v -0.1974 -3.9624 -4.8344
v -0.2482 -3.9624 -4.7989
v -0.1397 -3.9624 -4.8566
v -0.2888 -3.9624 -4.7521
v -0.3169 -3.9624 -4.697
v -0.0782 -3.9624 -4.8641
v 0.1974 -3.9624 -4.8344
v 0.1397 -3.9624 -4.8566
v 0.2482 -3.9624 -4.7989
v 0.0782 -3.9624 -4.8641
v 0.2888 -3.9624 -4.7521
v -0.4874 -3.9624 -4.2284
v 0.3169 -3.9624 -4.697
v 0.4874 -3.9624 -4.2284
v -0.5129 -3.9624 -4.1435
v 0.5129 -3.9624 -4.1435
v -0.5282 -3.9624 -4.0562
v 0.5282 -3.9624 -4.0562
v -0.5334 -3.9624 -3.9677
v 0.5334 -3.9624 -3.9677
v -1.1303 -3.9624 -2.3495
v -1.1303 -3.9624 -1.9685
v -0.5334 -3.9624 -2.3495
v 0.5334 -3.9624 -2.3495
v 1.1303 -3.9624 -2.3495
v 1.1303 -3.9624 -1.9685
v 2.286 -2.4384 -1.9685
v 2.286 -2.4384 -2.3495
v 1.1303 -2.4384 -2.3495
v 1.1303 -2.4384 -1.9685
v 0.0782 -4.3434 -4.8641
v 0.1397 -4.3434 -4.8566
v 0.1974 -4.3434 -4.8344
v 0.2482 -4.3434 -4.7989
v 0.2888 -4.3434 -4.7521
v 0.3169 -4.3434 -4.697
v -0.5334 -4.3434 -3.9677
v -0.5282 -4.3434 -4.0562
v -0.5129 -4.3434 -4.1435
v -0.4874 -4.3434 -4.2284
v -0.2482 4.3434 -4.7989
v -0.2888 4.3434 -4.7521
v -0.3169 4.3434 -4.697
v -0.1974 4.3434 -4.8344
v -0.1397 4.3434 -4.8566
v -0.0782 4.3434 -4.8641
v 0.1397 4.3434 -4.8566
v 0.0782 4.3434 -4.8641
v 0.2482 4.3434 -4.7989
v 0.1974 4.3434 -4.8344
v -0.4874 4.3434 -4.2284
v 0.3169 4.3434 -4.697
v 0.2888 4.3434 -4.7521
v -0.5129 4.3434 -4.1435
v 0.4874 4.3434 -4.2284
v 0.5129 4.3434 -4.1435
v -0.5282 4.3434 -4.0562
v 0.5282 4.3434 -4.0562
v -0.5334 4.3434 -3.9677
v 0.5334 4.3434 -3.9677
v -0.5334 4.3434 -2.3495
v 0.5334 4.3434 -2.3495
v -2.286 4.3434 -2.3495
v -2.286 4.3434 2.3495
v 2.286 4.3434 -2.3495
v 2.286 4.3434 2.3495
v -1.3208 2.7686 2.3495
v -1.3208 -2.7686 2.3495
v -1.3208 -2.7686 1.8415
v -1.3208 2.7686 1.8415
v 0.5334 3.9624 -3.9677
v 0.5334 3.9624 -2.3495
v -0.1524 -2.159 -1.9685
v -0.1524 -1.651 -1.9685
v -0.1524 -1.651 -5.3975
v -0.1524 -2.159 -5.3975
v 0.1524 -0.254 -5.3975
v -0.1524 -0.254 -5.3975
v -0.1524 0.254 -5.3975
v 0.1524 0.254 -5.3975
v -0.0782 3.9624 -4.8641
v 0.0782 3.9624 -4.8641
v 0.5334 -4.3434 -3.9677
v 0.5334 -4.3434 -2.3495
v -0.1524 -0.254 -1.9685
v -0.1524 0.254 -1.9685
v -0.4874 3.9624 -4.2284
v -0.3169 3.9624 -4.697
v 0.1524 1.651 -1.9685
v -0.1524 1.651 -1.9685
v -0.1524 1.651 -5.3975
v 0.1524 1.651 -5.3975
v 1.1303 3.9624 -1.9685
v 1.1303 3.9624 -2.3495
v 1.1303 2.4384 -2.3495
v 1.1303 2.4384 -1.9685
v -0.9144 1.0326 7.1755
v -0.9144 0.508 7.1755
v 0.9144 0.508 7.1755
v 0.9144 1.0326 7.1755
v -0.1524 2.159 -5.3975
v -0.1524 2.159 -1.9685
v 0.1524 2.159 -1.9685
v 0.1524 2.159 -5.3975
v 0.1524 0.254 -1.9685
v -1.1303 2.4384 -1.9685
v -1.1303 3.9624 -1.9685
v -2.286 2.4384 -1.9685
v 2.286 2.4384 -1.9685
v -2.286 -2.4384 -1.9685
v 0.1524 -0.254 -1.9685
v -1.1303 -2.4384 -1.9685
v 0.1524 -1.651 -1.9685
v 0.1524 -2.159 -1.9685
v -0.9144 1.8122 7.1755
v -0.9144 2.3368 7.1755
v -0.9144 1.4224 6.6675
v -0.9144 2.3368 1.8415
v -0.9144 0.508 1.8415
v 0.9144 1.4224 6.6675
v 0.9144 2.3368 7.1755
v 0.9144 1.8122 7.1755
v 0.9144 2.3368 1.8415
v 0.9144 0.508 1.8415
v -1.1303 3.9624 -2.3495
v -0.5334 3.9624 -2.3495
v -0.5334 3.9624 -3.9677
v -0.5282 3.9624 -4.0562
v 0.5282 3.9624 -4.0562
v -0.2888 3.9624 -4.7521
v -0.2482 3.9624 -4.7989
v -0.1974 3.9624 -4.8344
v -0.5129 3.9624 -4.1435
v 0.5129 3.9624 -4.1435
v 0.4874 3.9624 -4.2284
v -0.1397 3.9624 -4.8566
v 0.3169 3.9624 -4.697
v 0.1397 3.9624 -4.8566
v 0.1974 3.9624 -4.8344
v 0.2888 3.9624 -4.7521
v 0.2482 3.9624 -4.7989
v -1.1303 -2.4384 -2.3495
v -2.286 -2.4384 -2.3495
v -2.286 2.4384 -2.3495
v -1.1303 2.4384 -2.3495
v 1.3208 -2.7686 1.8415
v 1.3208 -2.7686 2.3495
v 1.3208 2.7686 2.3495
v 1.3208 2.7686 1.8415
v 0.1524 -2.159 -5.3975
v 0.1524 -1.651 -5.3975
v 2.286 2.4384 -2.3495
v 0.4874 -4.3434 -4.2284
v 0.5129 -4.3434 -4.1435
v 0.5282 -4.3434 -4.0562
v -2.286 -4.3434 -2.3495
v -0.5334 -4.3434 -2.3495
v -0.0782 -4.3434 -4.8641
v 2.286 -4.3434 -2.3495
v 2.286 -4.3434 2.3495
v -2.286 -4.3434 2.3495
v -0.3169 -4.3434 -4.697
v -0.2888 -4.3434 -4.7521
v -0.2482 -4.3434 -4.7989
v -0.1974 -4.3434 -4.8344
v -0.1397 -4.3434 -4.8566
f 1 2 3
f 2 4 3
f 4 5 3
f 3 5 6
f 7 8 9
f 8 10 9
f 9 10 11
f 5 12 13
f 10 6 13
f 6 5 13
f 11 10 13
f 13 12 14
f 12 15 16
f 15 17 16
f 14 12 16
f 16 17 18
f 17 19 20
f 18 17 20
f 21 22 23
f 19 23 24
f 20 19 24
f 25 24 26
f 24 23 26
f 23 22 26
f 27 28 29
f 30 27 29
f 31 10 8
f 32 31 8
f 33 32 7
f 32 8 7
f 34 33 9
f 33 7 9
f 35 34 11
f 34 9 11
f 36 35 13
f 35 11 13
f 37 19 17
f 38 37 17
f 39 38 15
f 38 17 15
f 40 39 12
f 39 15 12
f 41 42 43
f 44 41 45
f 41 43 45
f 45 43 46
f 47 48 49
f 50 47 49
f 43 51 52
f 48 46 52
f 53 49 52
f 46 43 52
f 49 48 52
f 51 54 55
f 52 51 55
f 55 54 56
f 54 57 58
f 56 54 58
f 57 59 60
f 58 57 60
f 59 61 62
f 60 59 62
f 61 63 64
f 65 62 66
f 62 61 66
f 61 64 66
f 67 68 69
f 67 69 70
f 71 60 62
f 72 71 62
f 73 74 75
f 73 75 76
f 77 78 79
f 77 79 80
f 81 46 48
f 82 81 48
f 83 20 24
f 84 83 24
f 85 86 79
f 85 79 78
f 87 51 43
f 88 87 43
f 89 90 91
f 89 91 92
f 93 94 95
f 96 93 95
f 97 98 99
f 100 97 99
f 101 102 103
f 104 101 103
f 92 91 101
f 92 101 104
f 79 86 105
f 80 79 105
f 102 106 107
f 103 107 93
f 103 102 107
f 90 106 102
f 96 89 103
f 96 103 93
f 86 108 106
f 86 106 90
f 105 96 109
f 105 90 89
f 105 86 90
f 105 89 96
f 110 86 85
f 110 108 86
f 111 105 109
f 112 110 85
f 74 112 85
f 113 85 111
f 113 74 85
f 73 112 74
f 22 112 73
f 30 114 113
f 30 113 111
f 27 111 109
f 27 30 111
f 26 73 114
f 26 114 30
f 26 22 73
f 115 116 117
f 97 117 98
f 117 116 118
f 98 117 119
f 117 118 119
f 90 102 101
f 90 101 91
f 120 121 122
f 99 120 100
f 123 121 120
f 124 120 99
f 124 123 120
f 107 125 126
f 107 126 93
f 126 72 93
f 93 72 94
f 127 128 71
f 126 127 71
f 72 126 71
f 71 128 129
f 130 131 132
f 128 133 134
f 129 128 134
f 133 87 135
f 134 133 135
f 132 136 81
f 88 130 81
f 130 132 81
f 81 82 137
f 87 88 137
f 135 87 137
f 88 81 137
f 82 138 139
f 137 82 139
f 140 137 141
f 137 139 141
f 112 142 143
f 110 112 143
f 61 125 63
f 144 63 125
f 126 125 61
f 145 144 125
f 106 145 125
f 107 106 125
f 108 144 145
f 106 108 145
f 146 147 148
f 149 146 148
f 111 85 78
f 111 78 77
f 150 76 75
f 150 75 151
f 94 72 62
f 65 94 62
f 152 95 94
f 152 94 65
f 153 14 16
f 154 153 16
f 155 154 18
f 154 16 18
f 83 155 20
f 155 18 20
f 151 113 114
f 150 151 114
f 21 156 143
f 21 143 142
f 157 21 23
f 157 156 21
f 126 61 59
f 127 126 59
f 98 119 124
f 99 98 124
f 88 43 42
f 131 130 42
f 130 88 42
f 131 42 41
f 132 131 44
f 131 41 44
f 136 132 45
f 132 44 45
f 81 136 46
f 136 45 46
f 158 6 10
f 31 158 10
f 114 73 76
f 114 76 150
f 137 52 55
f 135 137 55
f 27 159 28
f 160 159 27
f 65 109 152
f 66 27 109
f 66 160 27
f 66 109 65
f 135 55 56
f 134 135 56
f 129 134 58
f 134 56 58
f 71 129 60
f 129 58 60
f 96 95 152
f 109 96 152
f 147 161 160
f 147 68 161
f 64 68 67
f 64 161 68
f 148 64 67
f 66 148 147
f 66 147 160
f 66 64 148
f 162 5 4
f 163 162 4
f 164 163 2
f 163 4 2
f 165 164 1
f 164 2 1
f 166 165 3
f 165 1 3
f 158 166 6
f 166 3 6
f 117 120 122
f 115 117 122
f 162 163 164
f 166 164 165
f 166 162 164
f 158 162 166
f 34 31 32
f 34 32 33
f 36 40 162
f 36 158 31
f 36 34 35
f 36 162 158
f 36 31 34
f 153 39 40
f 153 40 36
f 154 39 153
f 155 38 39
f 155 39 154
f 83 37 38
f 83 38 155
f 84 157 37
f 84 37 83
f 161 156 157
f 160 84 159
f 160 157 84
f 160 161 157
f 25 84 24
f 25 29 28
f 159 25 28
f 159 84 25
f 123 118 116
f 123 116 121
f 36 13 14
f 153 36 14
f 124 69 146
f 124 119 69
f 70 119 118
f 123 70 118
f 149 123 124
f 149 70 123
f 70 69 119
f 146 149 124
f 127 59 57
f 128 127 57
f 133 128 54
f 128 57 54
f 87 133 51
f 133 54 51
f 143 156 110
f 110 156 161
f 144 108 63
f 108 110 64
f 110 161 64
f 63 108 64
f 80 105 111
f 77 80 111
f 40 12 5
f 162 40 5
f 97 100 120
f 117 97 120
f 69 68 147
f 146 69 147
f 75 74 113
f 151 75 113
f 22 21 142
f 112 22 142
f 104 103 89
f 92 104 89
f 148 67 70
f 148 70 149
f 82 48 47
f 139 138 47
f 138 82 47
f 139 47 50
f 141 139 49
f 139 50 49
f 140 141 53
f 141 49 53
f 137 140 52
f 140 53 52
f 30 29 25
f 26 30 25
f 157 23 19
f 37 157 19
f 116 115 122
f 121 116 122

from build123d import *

# Parameters (mm, degrees)
F0_W           = 4.572
F0_H           = 8.6868
F1_DEPTH       = 2.3495
F2_W           = 2.6416
F2_H           = 5.5372
F3_DEPTH       = 0.508
F4_W           = 1.8288
F4_H           = 1.8288
F5_DEPTH       = 9.525
F7_DEPTH       = 12.7
F9_DEPTH       = 0.381
F11_DEPTH      = 4.3434
F11_DEPTH_BACK = 4.3434
F12_W          = 2.2606
F12_H          = 7.9248
F13_DEPTH      = 2.8966
F14_W          = 0.3048
F14_H          = 0.508
F15_DEPTH      = 3.429


with BuildPart() as f1:
    # F0 (on Top) → F1 (new body, symmetric)
    with BuildSketch(Plane.XY):
        Rectangle(F0_W, F0_H)
    extrude(amount=F1_DEPTH, both=True)

    # F2 (on face) → F3 (cut)
    with BuildSketch(Plane.XY.offset(2.3495)):
        Rectangle(F2_W, F2_H)
    extrude(amount=-F3_DEPTH, mode=Mode.SUBTRACT)

    # F4 (on face) → F5 (join)
    with BuildSketch(Plane(origin=(0, 0, -2.3495), x_dir=(1, 0, 0), z_dir=(0, 0, -1))):
        with Locations((0, -1.4224)):
            Rectangle(F4_W, F4_H)
    extrude(amount=-F5_DEPTH)

    # F6 (on Right) → F7 (cut, symmetric)
    with BuildSketch(Plane.YZ):
        Polygon((1.8122021099, 7.1755), (1.0325978901, 7.1755), (1.4224, 6.6675), align=None)
    extrude(amount=F7_DEPTH, both=True, mode=Mode.SUBTRACT)

    # F8 (on face) → F9 (cut)
    with BuildSketch(Plane(origin=(0, 0, -2.3495), x_dir=(1, 0, 0), z_dir=(0, 0, -1))):
        Polygon((1.1303, 3.9624), (-1.1303, 3.9624), (-1.1303, 2.4384), (-2.286, 2.4384), (-2.286, 0), (-2.286, -2.4384), (-1.1303, -2.4384), (-1.1303, -3.9624), (1.1303, -3.9624), (1.1303, -2.4384), (2.286, -2.4384), (2.286, 0), (2.286, 2.4384), (1.1303, 2.4384), align=None)
    extrude(amount=-F9_DEPTH, mode=Mode.SUBTRACT)

    # F10 (on Front) → F11 (join, two sides)
    with BuildSketch(Plane.XZ) as f11_sk:
        with BuildLine():
            Line((0.5334, -3.9677388407), (0.5334, -2.3495))
            Line((0.5334, -2.3495), (-0.5334, -2.3495))
            Line((-0.5334, -2.3495), (-0.5334, -3.9677388407))
            ThreePointArc((-0.5334, -3.9677388407), (-0.5218235078, -4.1000587521), (-0.487445777, -4.2283581899))
            Line((-0.487445777, -4.2283581899), (-0.3168838925, -4.6969731164))
            ThreePointArc((-0.3168838925, -4.6969731164), (-0.2238903816, -4.8181646192), (-0.0782019668, -4.8641))
            Line((-0.0782019668, -4.8641), (0.0782019668, -4.8641))
            ThreePointArc((0.0782019668, -4.8641), (0.2238903816, -4.8181646192), (0.3168838925, -4.6969731164))
            Line((0.3168838925, -4.6969731164), (0.487445777, -4.2283581899))
            ThreePointArc((0.487445777, -4.2283581899), (0.5218235078, -4.1000587521), (0.5334, -3.9677388407))
        make_face()
    extrude(amount=-F11_DEPTH)
    extrude(f11_sk.sketch, amount=F11_DEPTH_BACK)

    # F12 (on face) → F13 (cut, through all)
    with BuildSketch(Plane(origin=(0, 0, -1.9685), x_dir=(1, 0, 0), z_dir=(0, 0, -1))):
        Rectangle(F12_W, F12_H)
    extrude(amount=F13_DEPTH, mode=Mode.SUBTRACT)

    # F14 (on face) → F15 (join)
    with BuildSketch(Plane(origin=(0, 0, -1.9685), x_dir=(1, 0, 0), z_dir=(0, 0, -1))):
        with Locations((0, 1.905)):
            Rectangle(F14_W, F14_H)
        Rectangle(F14_W, F14_H)
        with Locations((0, -1.905)):
            Rectangle(F14_W, F14_H)
    extrude(amount=F15_DEPTH)


solid = f1.part
